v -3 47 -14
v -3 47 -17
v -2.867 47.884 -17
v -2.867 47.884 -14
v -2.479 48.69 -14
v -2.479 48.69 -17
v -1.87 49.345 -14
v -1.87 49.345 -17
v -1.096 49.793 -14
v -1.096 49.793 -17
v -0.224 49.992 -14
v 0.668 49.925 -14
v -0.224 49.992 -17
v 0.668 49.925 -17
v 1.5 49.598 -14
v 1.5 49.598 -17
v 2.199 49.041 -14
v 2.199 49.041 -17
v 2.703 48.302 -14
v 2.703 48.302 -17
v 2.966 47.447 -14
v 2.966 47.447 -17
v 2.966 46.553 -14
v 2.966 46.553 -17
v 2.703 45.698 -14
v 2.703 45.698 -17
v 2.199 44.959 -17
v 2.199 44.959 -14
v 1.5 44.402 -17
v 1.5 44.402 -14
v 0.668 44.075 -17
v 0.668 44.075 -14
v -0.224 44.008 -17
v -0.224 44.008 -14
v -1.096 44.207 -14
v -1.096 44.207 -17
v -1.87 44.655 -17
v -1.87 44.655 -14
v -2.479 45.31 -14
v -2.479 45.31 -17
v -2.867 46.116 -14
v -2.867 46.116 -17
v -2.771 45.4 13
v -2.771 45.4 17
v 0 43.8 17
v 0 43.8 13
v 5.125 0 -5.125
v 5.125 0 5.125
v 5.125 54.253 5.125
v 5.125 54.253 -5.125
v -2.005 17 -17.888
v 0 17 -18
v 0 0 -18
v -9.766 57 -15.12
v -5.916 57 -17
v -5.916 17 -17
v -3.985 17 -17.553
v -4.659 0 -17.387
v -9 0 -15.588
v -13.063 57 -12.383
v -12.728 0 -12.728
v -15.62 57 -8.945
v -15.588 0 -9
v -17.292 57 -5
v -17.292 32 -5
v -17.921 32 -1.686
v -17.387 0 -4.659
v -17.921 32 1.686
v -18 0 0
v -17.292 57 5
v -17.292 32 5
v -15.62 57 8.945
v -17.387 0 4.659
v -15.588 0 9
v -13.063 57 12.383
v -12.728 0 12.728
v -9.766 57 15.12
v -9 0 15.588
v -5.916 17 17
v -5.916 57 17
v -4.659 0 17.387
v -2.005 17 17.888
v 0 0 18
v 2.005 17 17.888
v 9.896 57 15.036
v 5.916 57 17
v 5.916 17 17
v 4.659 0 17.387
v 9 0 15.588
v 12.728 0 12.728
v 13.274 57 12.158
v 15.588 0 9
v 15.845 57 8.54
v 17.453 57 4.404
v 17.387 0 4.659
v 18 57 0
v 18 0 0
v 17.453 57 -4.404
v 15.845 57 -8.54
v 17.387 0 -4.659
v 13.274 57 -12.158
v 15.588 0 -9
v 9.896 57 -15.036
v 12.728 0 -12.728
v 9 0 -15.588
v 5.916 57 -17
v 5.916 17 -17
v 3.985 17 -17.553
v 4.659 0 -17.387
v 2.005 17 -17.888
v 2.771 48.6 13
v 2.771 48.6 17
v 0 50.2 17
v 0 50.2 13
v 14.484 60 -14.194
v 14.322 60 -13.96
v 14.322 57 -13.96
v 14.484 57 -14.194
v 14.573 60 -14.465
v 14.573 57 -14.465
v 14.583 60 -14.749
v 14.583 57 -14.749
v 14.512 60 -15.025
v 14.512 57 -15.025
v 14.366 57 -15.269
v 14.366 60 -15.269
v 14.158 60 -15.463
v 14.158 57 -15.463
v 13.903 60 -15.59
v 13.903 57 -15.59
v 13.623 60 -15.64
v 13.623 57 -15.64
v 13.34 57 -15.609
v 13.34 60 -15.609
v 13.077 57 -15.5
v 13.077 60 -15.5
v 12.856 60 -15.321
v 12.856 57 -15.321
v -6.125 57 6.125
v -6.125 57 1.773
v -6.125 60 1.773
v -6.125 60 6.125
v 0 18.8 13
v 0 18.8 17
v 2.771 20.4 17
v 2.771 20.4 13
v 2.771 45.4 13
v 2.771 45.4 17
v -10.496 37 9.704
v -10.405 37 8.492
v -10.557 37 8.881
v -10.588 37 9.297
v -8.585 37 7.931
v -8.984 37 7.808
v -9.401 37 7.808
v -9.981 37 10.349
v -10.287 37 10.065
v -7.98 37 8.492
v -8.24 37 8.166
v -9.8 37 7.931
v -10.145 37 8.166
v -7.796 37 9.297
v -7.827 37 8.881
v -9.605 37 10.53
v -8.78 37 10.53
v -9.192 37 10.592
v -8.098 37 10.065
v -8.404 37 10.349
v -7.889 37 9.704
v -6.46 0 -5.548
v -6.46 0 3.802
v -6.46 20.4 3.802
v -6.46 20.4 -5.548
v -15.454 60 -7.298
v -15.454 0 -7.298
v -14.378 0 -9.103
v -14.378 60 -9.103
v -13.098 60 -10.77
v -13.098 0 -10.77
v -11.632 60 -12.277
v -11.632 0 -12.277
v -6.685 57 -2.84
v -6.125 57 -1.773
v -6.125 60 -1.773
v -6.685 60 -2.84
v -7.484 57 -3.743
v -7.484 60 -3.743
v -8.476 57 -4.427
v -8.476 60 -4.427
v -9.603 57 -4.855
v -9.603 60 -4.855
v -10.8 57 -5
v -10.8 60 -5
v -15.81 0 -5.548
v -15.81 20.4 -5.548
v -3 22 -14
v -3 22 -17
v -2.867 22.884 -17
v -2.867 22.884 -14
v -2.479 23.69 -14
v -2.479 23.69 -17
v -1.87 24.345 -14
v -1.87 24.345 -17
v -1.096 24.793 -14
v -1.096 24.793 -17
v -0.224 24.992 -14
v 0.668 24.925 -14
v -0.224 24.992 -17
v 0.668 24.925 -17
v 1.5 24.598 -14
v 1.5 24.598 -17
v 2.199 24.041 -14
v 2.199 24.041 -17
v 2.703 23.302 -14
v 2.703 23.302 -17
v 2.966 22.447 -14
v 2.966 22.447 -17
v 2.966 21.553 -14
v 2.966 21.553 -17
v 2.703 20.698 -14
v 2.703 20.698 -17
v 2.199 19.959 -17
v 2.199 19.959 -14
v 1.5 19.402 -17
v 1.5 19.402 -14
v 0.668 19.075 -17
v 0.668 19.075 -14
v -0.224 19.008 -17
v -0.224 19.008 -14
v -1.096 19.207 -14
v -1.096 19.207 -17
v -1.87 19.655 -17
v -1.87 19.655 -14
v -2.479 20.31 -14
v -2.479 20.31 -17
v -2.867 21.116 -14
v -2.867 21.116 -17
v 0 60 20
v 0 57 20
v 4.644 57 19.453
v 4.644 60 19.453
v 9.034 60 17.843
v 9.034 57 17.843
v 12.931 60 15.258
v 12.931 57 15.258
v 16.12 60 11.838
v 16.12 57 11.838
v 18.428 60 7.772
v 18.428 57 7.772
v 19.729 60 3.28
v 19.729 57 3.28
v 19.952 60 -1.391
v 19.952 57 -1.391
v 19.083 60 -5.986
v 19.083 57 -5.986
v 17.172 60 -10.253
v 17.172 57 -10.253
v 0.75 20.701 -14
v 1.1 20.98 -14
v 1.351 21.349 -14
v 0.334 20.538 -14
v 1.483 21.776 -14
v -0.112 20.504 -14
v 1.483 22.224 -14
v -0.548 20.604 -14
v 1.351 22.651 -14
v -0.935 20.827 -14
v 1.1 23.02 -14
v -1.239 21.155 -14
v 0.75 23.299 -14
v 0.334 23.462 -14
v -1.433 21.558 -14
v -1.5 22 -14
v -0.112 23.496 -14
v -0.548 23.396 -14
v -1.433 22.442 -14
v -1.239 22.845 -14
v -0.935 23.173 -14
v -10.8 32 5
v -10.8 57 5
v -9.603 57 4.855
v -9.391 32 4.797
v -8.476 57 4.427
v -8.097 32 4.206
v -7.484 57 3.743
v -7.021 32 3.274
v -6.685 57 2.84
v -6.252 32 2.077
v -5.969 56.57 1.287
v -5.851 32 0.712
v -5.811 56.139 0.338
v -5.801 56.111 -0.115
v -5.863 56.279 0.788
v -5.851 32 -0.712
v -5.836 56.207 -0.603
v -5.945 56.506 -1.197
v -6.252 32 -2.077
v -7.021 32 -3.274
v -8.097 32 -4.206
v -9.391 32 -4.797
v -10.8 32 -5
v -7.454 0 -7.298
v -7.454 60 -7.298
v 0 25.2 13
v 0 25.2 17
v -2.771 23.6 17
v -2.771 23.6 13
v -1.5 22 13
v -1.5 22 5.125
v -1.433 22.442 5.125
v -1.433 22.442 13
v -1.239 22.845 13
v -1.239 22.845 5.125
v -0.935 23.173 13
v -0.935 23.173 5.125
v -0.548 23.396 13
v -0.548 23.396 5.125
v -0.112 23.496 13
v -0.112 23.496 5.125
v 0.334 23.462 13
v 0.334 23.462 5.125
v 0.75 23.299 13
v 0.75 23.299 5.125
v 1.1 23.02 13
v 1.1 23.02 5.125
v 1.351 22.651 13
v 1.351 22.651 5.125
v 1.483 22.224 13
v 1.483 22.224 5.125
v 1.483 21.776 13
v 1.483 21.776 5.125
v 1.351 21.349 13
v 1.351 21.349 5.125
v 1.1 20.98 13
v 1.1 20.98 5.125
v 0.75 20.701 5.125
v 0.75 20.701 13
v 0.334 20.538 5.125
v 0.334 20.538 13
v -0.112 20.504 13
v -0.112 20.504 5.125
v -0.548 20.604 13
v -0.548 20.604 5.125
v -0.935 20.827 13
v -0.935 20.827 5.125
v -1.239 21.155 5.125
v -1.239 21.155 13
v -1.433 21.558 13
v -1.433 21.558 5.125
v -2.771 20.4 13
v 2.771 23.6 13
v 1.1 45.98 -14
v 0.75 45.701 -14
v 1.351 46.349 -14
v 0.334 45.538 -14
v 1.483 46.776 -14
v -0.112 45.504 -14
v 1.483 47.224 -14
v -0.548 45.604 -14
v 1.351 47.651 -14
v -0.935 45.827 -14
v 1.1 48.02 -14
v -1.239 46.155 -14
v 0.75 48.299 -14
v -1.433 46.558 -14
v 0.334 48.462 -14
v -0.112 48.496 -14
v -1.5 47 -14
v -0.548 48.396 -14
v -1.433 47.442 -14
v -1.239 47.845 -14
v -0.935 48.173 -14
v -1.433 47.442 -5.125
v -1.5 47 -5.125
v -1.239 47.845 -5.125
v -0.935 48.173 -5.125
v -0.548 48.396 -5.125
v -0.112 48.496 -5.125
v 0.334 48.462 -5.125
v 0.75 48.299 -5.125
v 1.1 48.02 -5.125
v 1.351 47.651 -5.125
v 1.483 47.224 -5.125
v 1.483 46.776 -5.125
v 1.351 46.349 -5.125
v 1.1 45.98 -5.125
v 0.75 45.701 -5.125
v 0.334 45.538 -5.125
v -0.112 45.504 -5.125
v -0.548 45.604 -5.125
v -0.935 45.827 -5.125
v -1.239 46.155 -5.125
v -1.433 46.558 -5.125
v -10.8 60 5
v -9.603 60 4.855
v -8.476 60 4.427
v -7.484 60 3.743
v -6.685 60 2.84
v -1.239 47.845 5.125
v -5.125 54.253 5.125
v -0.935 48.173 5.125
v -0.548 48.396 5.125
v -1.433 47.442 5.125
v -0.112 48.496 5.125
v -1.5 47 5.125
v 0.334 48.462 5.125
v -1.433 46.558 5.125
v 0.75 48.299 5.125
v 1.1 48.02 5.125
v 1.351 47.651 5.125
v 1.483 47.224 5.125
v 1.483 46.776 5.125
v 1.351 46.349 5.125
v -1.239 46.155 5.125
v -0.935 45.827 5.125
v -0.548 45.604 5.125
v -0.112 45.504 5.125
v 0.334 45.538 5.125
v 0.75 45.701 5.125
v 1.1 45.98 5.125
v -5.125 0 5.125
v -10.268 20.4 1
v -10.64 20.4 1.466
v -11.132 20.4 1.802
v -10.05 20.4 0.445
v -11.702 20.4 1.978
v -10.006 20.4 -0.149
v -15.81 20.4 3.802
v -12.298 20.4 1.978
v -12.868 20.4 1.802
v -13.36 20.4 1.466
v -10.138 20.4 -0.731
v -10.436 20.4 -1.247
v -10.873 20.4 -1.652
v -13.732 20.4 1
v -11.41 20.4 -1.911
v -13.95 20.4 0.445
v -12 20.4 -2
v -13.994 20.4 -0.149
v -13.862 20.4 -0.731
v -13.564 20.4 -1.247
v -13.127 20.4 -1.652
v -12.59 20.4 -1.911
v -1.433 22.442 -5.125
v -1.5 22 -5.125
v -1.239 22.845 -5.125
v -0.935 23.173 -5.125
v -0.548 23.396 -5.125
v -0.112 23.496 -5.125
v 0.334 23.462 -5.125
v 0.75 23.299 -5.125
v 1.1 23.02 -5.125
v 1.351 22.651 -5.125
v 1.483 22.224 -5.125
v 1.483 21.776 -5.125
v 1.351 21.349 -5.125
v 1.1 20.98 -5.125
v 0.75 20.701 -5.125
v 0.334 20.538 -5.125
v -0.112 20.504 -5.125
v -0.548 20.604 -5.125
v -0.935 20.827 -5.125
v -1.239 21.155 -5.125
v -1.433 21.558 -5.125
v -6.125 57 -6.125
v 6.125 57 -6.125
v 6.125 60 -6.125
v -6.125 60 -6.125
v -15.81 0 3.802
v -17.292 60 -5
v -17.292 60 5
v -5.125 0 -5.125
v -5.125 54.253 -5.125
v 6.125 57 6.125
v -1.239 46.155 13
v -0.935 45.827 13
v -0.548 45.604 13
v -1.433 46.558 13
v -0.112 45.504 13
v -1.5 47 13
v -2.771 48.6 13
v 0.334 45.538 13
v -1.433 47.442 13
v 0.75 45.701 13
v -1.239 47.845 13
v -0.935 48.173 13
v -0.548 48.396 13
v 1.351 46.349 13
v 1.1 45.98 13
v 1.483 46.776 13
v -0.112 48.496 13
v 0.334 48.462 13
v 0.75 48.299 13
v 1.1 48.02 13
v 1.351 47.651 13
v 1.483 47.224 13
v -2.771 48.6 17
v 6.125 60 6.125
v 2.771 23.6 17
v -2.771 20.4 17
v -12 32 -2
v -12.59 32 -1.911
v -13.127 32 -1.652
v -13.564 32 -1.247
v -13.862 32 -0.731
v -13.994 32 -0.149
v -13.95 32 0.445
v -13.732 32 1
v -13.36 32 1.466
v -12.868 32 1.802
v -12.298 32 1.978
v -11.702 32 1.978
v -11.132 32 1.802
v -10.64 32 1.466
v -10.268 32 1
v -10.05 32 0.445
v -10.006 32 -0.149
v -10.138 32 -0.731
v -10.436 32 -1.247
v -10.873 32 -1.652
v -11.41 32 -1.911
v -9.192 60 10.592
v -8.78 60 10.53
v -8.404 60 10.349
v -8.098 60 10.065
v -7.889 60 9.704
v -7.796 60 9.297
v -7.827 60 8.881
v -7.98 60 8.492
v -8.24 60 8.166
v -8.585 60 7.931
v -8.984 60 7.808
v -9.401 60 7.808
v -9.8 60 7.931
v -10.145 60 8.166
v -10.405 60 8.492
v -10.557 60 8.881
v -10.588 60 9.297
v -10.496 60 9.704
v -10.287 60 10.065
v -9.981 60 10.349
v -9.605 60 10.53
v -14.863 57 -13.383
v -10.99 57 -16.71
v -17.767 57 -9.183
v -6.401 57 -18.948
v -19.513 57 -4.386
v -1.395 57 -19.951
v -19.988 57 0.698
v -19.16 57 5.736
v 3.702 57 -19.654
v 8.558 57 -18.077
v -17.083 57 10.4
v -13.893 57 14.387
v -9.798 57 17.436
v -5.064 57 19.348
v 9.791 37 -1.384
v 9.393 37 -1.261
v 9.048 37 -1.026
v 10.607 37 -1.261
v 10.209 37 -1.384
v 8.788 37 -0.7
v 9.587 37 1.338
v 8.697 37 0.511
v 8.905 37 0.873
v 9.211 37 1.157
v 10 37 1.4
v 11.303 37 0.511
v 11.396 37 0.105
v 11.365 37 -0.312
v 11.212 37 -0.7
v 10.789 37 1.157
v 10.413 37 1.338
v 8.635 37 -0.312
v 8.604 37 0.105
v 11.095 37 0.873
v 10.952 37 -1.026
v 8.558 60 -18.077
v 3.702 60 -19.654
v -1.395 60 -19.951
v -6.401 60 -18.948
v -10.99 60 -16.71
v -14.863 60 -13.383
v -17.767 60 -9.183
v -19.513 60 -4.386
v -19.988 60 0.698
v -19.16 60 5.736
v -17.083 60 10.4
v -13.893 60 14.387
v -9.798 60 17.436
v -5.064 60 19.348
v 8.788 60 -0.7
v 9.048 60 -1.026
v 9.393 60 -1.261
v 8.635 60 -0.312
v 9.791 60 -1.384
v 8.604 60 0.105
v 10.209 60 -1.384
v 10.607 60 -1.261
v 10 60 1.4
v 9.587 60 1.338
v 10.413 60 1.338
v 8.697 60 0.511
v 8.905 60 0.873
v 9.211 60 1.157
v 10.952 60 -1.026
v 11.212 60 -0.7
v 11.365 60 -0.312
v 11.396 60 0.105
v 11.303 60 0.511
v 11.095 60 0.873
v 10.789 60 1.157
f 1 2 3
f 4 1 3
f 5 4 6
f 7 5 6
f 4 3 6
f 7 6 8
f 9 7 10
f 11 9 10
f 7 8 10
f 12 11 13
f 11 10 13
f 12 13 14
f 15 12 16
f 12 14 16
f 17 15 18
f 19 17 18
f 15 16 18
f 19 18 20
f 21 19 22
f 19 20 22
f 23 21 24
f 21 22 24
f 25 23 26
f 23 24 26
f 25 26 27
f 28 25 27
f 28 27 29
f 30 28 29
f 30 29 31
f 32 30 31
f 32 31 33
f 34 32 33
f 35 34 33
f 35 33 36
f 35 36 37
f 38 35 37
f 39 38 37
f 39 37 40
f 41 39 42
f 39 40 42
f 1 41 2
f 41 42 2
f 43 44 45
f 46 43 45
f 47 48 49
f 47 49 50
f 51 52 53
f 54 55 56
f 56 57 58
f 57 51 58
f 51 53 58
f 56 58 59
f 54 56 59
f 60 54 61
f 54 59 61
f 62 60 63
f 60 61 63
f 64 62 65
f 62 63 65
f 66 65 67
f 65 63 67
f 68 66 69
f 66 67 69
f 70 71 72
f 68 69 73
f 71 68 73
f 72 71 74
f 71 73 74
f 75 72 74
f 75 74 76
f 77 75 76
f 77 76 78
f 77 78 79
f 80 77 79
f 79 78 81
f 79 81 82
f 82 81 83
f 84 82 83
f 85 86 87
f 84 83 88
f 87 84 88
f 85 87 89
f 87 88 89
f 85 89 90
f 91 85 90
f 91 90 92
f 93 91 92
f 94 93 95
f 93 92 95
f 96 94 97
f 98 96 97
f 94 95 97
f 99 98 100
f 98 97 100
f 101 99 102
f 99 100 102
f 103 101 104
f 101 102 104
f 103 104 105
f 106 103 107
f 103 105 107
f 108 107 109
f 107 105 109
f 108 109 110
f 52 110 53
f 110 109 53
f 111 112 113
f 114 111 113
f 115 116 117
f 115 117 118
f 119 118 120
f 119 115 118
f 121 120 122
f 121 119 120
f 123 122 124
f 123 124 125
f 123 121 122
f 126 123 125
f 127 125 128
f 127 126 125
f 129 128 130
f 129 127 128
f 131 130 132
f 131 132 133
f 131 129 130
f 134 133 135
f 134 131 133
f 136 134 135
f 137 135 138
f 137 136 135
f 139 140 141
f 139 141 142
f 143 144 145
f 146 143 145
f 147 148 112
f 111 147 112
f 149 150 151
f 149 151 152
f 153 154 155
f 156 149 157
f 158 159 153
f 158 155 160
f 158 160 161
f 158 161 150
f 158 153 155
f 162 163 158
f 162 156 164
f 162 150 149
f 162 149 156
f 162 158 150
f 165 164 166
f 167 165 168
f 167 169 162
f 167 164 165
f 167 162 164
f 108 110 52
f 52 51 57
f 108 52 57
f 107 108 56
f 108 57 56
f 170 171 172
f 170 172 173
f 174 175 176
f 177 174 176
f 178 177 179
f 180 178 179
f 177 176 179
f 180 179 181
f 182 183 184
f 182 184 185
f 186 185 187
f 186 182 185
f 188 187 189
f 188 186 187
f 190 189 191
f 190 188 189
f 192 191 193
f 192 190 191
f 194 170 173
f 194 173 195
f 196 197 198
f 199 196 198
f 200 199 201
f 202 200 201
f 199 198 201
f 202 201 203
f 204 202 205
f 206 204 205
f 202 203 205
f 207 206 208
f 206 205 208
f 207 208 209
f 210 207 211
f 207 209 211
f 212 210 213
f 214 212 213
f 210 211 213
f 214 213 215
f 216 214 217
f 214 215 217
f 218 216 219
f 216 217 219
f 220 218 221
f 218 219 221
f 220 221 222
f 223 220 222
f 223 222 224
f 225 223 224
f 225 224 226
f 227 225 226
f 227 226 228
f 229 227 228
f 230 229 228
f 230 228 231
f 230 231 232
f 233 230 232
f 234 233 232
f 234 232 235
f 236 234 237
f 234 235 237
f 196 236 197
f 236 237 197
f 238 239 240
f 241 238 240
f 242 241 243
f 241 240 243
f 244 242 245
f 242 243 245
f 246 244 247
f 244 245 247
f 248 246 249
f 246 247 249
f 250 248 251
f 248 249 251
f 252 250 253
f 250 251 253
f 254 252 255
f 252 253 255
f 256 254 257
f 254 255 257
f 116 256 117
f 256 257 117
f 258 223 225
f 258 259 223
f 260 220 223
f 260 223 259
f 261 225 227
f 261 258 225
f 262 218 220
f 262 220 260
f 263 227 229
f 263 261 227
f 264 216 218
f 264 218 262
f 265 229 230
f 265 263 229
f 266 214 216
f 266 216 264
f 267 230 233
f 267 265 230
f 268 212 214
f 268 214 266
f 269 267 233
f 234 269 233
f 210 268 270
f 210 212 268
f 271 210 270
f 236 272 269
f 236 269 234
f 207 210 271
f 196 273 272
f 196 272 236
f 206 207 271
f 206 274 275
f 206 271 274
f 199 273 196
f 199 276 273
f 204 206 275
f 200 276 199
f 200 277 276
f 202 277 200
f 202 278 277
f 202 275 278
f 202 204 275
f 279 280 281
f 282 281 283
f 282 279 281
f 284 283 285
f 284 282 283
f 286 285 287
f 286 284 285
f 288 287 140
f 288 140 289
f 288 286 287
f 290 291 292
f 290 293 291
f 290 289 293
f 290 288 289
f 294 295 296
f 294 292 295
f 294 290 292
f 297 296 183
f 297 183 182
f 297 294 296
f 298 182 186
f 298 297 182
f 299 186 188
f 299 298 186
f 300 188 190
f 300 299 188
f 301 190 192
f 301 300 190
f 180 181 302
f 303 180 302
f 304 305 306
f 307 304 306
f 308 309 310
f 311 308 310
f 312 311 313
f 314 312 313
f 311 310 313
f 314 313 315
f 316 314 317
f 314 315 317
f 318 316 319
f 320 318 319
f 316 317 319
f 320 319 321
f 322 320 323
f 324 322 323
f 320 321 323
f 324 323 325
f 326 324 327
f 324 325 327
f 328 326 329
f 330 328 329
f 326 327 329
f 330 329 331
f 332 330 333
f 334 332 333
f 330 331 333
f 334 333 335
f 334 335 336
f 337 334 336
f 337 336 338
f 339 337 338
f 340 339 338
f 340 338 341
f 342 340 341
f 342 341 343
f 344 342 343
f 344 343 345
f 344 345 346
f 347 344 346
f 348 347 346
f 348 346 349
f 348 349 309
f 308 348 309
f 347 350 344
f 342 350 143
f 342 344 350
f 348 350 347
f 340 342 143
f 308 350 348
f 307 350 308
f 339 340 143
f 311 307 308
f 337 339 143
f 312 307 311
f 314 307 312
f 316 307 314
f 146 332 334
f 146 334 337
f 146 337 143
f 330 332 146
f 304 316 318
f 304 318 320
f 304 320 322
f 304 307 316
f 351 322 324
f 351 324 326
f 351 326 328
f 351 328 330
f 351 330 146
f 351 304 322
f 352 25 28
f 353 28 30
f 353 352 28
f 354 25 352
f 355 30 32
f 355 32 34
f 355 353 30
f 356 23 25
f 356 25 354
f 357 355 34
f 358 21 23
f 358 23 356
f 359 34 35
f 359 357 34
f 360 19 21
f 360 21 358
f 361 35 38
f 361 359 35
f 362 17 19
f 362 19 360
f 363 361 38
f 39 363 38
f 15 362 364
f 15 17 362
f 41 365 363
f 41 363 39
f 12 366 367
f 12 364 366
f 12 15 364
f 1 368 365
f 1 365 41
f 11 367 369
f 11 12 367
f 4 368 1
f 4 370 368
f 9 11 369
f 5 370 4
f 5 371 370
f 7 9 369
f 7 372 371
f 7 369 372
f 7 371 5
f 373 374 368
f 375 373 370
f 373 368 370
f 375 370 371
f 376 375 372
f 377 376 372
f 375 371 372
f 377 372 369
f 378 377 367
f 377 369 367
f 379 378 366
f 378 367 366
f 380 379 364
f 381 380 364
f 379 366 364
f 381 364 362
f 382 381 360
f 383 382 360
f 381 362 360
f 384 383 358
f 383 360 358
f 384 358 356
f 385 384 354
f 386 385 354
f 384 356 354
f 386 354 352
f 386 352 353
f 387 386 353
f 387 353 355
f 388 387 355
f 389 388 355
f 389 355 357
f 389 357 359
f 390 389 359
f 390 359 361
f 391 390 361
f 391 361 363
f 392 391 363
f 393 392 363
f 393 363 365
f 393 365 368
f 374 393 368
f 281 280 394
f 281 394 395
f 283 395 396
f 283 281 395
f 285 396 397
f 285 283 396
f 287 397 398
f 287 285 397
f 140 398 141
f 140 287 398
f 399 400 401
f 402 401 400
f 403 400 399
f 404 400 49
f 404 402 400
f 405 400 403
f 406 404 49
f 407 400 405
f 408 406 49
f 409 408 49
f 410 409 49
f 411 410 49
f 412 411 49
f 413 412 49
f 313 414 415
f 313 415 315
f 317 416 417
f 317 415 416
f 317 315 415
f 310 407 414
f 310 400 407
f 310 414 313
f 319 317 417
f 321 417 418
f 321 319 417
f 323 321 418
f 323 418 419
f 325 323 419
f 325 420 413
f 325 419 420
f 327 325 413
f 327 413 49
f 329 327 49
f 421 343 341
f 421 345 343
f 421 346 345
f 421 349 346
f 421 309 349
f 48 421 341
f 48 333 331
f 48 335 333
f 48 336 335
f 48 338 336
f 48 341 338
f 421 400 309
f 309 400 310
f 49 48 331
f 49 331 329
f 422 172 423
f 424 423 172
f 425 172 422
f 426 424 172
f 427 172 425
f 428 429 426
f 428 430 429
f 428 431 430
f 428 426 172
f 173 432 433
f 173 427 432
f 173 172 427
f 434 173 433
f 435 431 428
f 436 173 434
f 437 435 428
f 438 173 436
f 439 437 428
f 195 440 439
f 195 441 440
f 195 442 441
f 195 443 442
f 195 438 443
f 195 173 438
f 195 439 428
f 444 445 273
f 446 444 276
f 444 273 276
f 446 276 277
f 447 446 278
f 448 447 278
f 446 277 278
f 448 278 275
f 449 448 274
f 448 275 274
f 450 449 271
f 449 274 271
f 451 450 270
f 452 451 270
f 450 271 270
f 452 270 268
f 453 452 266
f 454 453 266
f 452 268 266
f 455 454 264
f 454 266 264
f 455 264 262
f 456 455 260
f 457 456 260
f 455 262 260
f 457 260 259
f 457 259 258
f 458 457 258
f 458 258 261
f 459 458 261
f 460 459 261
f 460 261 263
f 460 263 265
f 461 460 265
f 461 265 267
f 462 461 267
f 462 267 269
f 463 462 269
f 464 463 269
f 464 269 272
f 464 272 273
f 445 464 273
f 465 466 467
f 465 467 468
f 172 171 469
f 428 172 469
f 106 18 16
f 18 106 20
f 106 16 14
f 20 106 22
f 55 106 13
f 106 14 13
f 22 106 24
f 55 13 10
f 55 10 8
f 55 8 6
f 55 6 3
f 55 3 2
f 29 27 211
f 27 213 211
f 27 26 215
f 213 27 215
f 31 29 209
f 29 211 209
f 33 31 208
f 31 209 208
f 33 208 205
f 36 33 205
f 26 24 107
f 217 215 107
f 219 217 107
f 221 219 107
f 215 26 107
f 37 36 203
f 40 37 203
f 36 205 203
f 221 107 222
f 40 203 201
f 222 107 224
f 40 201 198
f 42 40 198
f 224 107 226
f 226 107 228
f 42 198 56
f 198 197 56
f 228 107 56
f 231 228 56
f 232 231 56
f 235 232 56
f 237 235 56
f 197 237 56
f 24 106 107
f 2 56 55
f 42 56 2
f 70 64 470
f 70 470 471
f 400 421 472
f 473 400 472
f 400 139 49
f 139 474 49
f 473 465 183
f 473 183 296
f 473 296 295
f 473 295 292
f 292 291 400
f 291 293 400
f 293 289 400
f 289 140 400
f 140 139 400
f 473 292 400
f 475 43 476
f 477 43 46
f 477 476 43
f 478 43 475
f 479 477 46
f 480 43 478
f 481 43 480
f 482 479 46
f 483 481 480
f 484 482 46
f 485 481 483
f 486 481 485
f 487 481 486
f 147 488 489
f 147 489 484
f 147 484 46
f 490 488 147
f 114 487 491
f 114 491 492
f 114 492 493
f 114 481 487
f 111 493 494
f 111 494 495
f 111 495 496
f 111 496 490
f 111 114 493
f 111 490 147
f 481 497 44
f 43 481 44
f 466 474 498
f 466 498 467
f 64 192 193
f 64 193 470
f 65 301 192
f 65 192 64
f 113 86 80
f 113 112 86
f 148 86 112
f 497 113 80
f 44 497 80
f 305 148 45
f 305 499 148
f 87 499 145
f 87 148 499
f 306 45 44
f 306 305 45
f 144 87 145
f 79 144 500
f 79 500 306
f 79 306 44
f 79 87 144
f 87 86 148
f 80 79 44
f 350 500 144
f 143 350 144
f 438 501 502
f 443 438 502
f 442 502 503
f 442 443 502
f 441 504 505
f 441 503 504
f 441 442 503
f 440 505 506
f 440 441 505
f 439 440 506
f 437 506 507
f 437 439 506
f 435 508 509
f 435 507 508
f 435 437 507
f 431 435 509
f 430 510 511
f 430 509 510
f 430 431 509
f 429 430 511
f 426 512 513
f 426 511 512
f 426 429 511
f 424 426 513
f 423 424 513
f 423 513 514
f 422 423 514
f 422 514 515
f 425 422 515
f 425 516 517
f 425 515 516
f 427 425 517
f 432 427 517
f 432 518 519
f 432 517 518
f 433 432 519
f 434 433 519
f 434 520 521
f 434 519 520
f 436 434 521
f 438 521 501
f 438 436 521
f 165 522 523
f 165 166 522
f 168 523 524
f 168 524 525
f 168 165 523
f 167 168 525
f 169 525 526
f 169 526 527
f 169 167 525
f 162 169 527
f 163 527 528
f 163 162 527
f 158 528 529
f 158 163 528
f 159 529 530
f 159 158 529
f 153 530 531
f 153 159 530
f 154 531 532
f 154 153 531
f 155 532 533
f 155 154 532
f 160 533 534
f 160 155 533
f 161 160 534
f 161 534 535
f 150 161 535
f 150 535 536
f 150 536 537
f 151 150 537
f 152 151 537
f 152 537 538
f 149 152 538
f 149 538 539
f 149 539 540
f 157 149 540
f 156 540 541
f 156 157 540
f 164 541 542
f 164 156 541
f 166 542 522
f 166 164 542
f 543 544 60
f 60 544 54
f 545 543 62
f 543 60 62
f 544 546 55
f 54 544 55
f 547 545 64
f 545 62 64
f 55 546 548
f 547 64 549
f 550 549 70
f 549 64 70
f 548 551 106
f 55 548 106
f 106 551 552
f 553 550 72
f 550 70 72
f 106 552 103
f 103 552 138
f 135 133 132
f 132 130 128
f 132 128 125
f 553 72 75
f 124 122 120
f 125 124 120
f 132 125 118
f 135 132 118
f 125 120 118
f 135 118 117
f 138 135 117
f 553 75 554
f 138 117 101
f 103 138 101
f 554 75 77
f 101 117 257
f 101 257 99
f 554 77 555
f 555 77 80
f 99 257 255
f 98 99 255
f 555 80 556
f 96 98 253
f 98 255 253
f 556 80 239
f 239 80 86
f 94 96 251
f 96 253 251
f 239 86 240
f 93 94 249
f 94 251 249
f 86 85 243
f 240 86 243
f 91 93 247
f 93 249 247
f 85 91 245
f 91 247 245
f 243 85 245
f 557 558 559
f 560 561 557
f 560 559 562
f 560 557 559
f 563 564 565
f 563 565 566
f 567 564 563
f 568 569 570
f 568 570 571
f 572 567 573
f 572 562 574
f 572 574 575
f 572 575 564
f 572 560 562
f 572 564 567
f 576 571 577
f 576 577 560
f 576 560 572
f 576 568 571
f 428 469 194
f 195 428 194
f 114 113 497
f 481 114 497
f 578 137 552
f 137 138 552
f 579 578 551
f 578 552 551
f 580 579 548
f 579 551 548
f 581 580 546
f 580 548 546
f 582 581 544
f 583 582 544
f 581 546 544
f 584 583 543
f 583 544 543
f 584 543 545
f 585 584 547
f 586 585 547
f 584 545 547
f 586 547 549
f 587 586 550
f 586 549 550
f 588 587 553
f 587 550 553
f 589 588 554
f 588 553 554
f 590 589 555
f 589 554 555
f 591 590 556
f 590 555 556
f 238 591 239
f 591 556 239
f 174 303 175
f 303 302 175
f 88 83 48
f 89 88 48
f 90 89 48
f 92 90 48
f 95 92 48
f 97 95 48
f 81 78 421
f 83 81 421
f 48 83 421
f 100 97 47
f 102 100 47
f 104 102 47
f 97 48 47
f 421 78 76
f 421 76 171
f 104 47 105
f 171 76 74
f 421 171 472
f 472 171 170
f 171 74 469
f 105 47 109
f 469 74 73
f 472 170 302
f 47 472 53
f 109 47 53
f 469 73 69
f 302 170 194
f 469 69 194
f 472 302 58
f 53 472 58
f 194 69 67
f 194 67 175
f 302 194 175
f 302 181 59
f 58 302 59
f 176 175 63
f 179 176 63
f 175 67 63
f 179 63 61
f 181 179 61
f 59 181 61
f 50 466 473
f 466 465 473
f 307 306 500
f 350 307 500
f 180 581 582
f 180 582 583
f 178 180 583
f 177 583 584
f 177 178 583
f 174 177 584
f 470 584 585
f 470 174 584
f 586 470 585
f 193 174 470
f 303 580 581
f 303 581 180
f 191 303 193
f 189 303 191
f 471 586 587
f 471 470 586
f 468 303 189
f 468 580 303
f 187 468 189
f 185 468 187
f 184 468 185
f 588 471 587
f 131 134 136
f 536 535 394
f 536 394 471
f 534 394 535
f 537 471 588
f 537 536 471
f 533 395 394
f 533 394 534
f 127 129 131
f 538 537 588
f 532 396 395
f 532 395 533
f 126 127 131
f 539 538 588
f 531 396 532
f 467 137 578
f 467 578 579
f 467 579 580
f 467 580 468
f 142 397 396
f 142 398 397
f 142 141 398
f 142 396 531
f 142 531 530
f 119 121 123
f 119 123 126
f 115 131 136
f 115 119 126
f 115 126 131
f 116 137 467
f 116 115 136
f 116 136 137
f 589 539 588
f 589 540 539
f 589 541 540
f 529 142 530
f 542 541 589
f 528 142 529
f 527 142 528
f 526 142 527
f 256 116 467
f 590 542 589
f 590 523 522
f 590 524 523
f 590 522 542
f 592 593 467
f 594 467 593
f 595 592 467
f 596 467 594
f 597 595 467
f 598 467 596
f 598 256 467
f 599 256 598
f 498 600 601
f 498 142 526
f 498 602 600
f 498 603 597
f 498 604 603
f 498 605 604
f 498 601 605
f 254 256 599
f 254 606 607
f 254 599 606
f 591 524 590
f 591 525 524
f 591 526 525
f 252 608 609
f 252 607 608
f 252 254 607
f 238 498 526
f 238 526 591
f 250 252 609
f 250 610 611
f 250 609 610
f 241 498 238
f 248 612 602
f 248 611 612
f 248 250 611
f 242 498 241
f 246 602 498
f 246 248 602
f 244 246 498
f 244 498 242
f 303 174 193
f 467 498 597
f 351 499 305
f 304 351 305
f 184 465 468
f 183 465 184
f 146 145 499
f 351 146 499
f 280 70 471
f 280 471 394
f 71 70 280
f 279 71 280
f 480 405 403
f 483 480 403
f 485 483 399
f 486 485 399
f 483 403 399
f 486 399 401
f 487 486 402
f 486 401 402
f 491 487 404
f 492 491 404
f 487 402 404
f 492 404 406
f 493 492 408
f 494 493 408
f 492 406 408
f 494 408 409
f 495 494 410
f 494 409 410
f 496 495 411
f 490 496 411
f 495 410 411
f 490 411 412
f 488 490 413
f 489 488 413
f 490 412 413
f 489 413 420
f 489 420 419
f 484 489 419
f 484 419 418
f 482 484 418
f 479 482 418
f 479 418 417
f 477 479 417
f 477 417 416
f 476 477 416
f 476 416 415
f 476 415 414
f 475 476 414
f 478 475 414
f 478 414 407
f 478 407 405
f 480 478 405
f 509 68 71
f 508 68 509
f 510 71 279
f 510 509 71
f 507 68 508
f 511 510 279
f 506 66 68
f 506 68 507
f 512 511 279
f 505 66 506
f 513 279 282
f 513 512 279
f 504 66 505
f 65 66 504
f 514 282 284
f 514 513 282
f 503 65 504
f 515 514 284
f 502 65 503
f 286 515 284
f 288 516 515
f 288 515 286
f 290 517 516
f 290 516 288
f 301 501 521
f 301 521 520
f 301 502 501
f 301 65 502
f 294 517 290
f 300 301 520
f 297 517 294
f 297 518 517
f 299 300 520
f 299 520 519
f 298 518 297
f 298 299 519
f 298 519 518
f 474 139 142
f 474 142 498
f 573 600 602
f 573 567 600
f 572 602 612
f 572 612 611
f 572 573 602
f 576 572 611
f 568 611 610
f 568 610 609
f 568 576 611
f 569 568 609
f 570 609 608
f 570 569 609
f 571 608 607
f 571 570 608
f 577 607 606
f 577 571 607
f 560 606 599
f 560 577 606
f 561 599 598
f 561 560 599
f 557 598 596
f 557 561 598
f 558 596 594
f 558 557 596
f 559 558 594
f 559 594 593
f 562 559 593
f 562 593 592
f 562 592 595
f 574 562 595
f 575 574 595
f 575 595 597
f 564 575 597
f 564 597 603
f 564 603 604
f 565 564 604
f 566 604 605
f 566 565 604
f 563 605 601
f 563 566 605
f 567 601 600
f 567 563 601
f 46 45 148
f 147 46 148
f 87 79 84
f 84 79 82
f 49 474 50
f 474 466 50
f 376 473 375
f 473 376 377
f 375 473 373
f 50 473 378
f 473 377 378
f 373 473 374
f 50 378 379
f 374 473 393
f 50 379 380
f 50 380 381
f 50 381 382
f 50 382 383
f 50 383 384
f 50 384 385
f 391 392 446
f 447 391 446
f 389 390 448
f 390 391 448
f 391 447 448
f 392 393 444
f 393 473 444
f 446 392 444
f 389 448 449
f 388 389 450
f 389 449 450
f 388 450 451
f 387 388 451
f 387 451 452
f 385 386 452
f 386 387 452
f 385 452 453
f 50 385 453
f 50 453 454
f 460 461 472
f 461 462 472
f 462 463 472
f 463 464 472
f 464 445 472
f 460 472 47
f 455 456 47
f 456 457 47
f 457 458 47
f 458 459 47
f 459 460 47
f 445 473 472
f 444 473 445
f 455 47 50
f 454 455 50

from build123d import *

# Parameters (mm, degrees)
SKETCH1_R           = 18
SKETCH1_R_2         = 2
SKETCH1_W           = 10.25
SKETCH1_H           = 10.25
BOSS_EXTRUDE1_DEPTH = 57
CUT_EXTRUDE1_START  = -25
CUT_EXTRUDE1_DEPTH  = 25
SKETCH4_W           = 9.35
SKETCH4_H           = 9.35
CUT_EXTRUDE3_DEPTH  = 20.4
CUT_EXTRUDE4_START  = -40
CUT_EXTRUDE4_DEPTH  = 40
SKETCH6_R           = 1.5
CUT_EXTRUDE5_DEPTH  = 70.267597042
SKETCH7_R           = 3
CUT_EXTRUDE6_DEPTH  = 3
CUT_EXTRUDE7_DEPTH  = 4
CHAMFER1_SIZE       = 1
CHAMFER1_SIZE_2     = 2.747477419
CUT_EXTRUDE8_DEPTH  = 63.42595614
SKETCH12_R          = 1.4
CUT_EXTRUDE10_DEPTH = 20
SKETCH13_R          = 20
SKETCH13_R_2        = 1.4
BOSS_EXTRUDE2_DEPTH = 3
BOSS_EXTRUDE3_DEPTH = 3


with BuildPart() as part:
    # Sketch1 → Boss-Extrude1 (new body)
    with BuildSketch(Plane(origin=(0, 0, 0), x_dir=(1, 0, 0), z_dir=(0, 1, 0))):
        with Locations(Location((0, 0, 0), (0, 0, 90))):
            Circle(SKETCH1_R)
        with Locations(Location((-12, 0, 0), (0, 0, 90))):
            Circle(SKETCH1_R_2, mode=Mode.SUBTRACT)
        Rectangle(SKETCH1_W, SKETCH1_H, mode=Mode.SUBTRACT)
    extrude(amount=BOSS_EXTRUDE1_DEPTH)

    # Sketch2 → Cut-Extrude1 (cut)
    with BuildSketch(Plane(origin=(0, 57, 0), x_dir=(1, 0, 0), z_dir=(0, 1, 0)).offset(CUT_EXTRUDE1_START)):
        with BuildLine():
            Line((-10.8, 5), (-17.291616466, 5))
            ThreePointArc((-17.291616466, 5), (-18, 0), (-17.291616466, -5))
            Line((-17.291616466, -5), (-10.8, -5))
            ThreePointArc((-10.8, -5), (-5.8, 0), (-10.8, 5))
        make_face()
    extrude(amount=CUT_EXTRUDE1_DEPTH, mode=Mode.SUBTRACT)

    # Sketch4 → Cut-Extrude3 (cut)
    with BuildSketch(Plane(origin=(0, 0, 0), x_dir=(-1, 0, 0), z_dir=(0, -1, 0))):
        with Locations((11.135393506, 0.872889968)):
            Rectangle(SKETCH4_W, SKETCH4_H)
    extrude(amount=-CUT_EXTRUDE3_DEPTH, mode=Mode.SUBTRACT)

    # Sketch5 → Cut-Extrude4 (cut)
    with BuildSketch(Plane(origin=(0, 57, 0), x_dir=(1, 0, 0), z_dir=(0, 1, 0)).offset(CUT_EXTRUDE4_START)):
        with BuildLine():
            Line((5.916079783, 17), (-5.916079783, 17))
            ThreePointArc((-5.916079783, 17), (0, 18), (5.916079783, 17))
        make_face()
        with BuildLine():
            Line((5.916079783, -17), (-5.916079783, -17))
            ThreePointArc((-5.916079783, -17), (0, -18), (5.916079783, -17))
        make_face()
    extrude(amount=CUT_EXTRUDE4_DEPTH, mode=Mode.SUBTRACT)

    # Sketch6 → Cut-Extrude5 (cut, through all)
    with BuildSketch(Plane(origin=(0, 0, -17), x_dir=(-1, 0, 0), z_dir=(0, 0, -1))):
        with Locations((0, 47)):
            Circle(SKETCH6_R)
        with Locations((0, 22)):
            Circle(SKETCH6_R)
    extrude(amount=-CUT_EXTRUDE5_DEPTH, mode=Mode.SUBTRACT)

    # Sketch7 → Cut-Extrude6 (cut)
    with BuildSketch(Plane(origin=(0, 0, -17), x_dir=(-1, 0, 0), z_dir=(0, 0, -1))):
        with Locations((0, 47)):
            Circle(SKETCH7_R)
        with Locations((0, 22)):
            Circle(SKETCH7_R)
    extrude(amount=-CUT_EXTRUDE6_DEPTH, mode=Mode.SUBTRACT)

    # Sketch8 → Cut-Extrude7 (cut)
    with BuildSketch(Plane.XY.offset(17)):
        Polygon((0, 43.8), (2.771281292, 45.4), (2.771281292, 48.6), (0, 50.2), (-2.771281292, 48.6), (-2.771281292, 45.4), align=None)
        Polygon((0, 18.8), (2.771281292, 20.4), (2.771281292, 23.6), (0, 25.2), (-2.771281292, 23.6), (-2.771281292, 20.4), align=None)
    extrude(amount=-CUT_EXTRUDE7_DEPTH, mode=Mode.SUBTRACT)

    # Chamfer1
    # the kernel refuses this chamfer: 2.747477419, 1 mm, written as the material it takes off along each edge
    with BuildSketch(Plane(origin=(-5.125, 57, -5.125), x_dir=(0, 0.09904090225204956, -0.9950833631817488), z_dir=(1, 0, 0)), Plane(origin=(-5.125, 57, 5.125), x_dir=(-0.9950833631817488, 0.09904090225204956, 0), z_dir=(0, 0, -1)), Plane(origin=(5.125, 57, 5.125), x_dir=(0, 0.09904090225204956, 0.9950833631817488), z_dir=(-1, 0, 0)), Plane(origin=(5.125, 57, -5.125), x_dir=(0.9950833631817488, 0.09904090225204956, 0), z_dir=(0, 0, 1))) as chamfer1_piece_1:
        Polygon((CHAMFER1_SIZE * 0.995083363182, -CHAMFER1_SIZE * 0.099040902252), (-CHAMFER1_SIZE_2 * 0.0990409022684, -CHAMFER1_SIZE_2 * 0.995083363346), (0, 0), align=None)
    extrude(amount=10.25, mode=Mode.SUBTRACT)
    with BuildSketch(Plane(origin=(-5.125, 57, 5.125), x_dir=(-0.9950833631817488, 0.09904090225204956, 0), z_dir=(0, 0, -1))) as chamfer1_piece_2a_section:
        Polygon((CHAMFER1_SIZE * 0.995083363182, -CHAMFER1_SIZE * 0.099040902252), (-CHAMFER1_SIZE_2 * 0.0990409022684, -CHAMFER1_SIZE_2 * 0.995083363346), (0, 0), align=None)
    chamfer1_piece_2a = extrude(amount=17.377491449, mode=Mode.PRIVATE)
    chamfer1_piece_2a = split(chamfer1_piece_2a, bisect_by=Plane(origin=(-5.432505006, 56.059901151, -5.125), z_dir=(0, 0, -1)), keep=Keep.TOP, mode=Mode.PRIVATE)
    with BuildSketch(Plane(origin=(-12.252491449, 57, -5.125), x_dir=(0, 0.09904090225204956, -0.9950833631817488), z_dir=(1, 0, 0))) as chamfer1_piece_2b_section:
        Polygon((CHAMFER1_SIZE * 0.995083363182, -CHAMFER1_SIZE * 0.099040902252), (-CHAMFER1_SIZE_2 * 0.0990409022684, -CHAMFER1_SIZE_2 * 0.995083363346), (0, 0), align=None)
    chamfer1_piece_2b = extrude(amount=17.377491449, mode=Mode.PRIVATE)
    chamfer1_piece_2b = split(chamfer1_piece_2b, bisect_by=Plane(origin=(-5.125, 56.059901151, -5.432505006), z_dir=(-1, 0, 0)), keep=Keep.TOP, mode=Mode.PRIVATE)
    chamfer1_piece_2 = chamfer1_piece_2a & chamfer1_piece_2b
    add(chamfer1_piece_2, mode=Mode.SUBTRACT)
    with BuildSketch(Plane(origin=(5.125, 57, -12.252491449), x_dir=(0.9950833631817488, 0.09904090225204956, 0), z_dir=(0, 0, 1))) as chamfer1_piece_3a_section:
        Polygon((CHAMFER1_SIZE * 0.995083363182, -CHAMFER1_SIZE * 0.099040902252), (-CHAMFER1_SIZE_2 * 0.0990409022684, -CHAMFER1_SIZE_2 * 0.995083363346), (0, 0), align=None)
    chamfer1_piece_3a = extrude(amount=17.377491449, mode=Mode.PRIVATE)
    chamfer1_piece_3a = split(chamfer1_piece_3a, bisect_by=Plane(origin=(5.432505006, 56.059901151, -5.125), z_dir=(0, 0, -1)), keep=Keep.TOP, mode=Mode.PRIVATE)
    with BuildSketch(Plane(origin=(-5.125, 57, -5.125), x_dir=(0, 0.09904090225204956, -0.9950833631817488), z_dir=(1, 0, 0))) as chamfer1_piece_3b_section:
        Polygon((CHAMFER1_SIZE * 0.995083363182, -CHAMFER1_SIZE * 0.099040902252), (-CHAMFER1_SIZE_2 * 0.0990409022684, -CHAMFER1_SIZE_2 * 0.995083363346), (0, 0), align=None)
    chamfer1_piece_3b = extrude(amount=17.377491449, mode=Mode.PRIVATE)
    chamfer1_piece_3b = split(chamfer1_piece_3b, bisect_by=Plane(origin=(5.125, 56.059901151, -5.432505006), z_dir=(1, 0, 0)), keep=Keep.TOP, mode=Mode.PRIVATE)
    chamfer1_piece_3 = chamfer1_piece_3a & chamfer1_piece_3b
    add(chamfer1_piece_3, mode=Mode.SUBTRACT)
    with BuildSketch(Plane(origin=(5.125, 57, 5.125), x_dir=(0, 0.09904090225204956, 0.9950833631817488), z_dir=(-1, 0, 0))) as chamfer1_piece_4a_section:
        Polygon((CHAMFER1_SIZE * 0.995083363182, -CHAMFER1_SIZE * 0.099040902252), (-CHAMFER1_SIZE_2 * 0.0990409022684, -CHAMFER1_SIZE_2 * 0.995083363346), (0, 0), align=None)
    chamfer1_piece_4a = extrude(amount=17.377491449, mode=Mode.PRIVATE)
    chamfer1_piece_4a = split(chamfer1_piece_4a, bisect_by=Plane(origin=(-5.125, 56.059901151, 5.432505006), z_dir=(-1, 0, 0)), keep=Keep.TOP, mode=Mode.PRIVATE)
    with BuildSketch(Plane(origin=(-5.125, 57, 12.252491449), x_dir=(-0.9950833631817488, 0.09904090225204956, 0), z_dir=(0, 0, -1))) as chamfer1_piece_4b_section:
        Polygon((CHAMFER1_SIZE * 0.995083363182, -CHAMFER1_SIZE * 0.099040902252), (-CHAMFER1_SIZE_2 * 0.0990409022684, -CHAMFER1_SIZE_2 * 0.995083363346), (0, 0), align=None)
    chamfer1_piece_4b = extrude(amount=17.377491449, mode=Mode.PRIVATE)
    chamfer1_piece_4b = split(chamfer1_piece_4b, bisect_by=Plane(origin=(-5.432505006, 56.059901151, 5.125), z_dir=(0, 0, 1)), keep=Keep.TOP, mode=Mode.PRIVATE)
    chamfer1_piece_4 = chamfer1_piece_4a & chamfer1_piece_4b
    add(chamfer1_piece_4, mode=Mode.SUBTRACT)
    with BuildSketch(Plane(origin=(12.252491449, 57, 5.125), x_dir=(0, 0.09904090225204956, 0.9950833631817488), z_dir=(-1, 0, 0))) as chamfer1_piece_5a_section:
        Polygon((CHAMFER1_SIZE * 0.995083363182, -CHAMFER1_SIZE * 0.099040902252), (-CHAMFER1_SIZE_2 * 0.0990409022684, -CHAMFER1_SIZE_2 * 0.995083363346), (0, 0), align=None)
    chamfer1_piece_5a = extrude(amount=17.377491449, mode=Mode.PRIVATE)
    chamfer1_piece_5a = split(chamfer1_piece_5a, bisect_by=Plane(origin=(5.125, 56.059901151, 5.432505006), z_dir=(1, 0, 0)), keep=Keep.TOP, mode=Mode.PRIVATE)
    with BuildSketch(Plane(origin=(5.125, 57, -5.125), x_dir=(0.9950833631817488, 0.09904090225204956, 0), z_dir=(0, 0, 1))) as chamfer1_piece_5b_section:
        Polygon((CHAMFER1_SIZE * 0.995083363182, -CHAMFER1_SIZE * 0.099040902252), (-CHAMFER1_SIZE_2 * 0.0990409022684, -CHAMFER1_SIZE_2 * 0.995083363346), (0, 0), align=None)
    chamfer1_piece_5b = extrude(amount=17.377491449, mode=Mode.PRIVATE)
    chamfer1_piece_5b = split(chamfer1_piece_5b, bisect_by=Plane(origin=(5.432505006, 56.059901151, 5.125), z_dir=(0, 0, 1)), keep=Keep.TOP, mode=Mode.PRIVATE)
    chamfer1_piece_5 = chamfer1_piece_5a & chamfer1_piece_5b
    add(chamfer1_piece_5, mode=Mode.SUBTRACT)

    # Sketch9 → Cut-Extrude8 (cut, through all)
    with BuildSketch(Plane.XZ):
        with BuildLine():
            Line((-7.454203172, -7.297889968), (-15.454203172, -7.297889968))
            ThreePointArc((-15.454203172, -7.297889968), (-13.761984914, -9.955415688), (-11.632322635, -12.277178848))
            Line((-11.632322635, -12.277178848), (-7.454203172, -7.297889968))
        make_face()
    extrude(amount=-CUT_EXTRUDE8_DEPTH, mode=Mode.SUBTRACT)

    # Sketch12 → Cut-Extrude10 (cut)
    with BuildSketch(Plane(origin=(0, 57, 0), x_dir=(1, 0, 0), z_dir=(0, 1, 0))):
        with Locations(Location((10, 0, 0), (0, 0, 270))):
            Circle(SKETCH12_R)
        with Locations(Location((-9.192388155, -9.192388155, 0), (0, 0, 270))):
            Circle(SKETCH12_R)
    extrude(amount=-CUT_EXTRUDE10_DEPTH, mode=Mode.SUBTRACT)

    # Sketch13 → Boss-Extrude2 (add)
    with BuildSketch(Plane(origin=(0, 57, 0), x_dir=(1, 0, 0), z_dir=(0, 1, 0))):
        with Locations(Location((0, 0, 0), (0, 0, 270))):
            Circle(SKETCH13_R)
        with Locations(Location((10, 0, 0), (0, 0, 270))):
            Circle(SKETCH13_R_2, mode=Mode.SUBTRACT)
        with Locations(Location((-9.192388155, -9.192388155, 0), (0, 0, 270))):
            Circle(SKETCH13_R_2, mode=Mode.SUBTRACT)
        with BuildLine():
            Line((-10.8, 5), (-17.291616466, 5))
            Line((-17.291616466, 5), (-17.291616466, -5))
            Line((-17.291616466, -5), (-10.8, -5))
            ThreePointArc((-10.8, -5), (-7.959770503, -4.114984375), (-6.125, -1.773238563))
            Line((-6.125, -1.773238563), (-6.125, -6.125))
            Line((-6.125, -6.125), (6.125, -6.125))
            Line((6.125, -6.125), (6.125, 6.125))
            Line((6.125, 6.125), (-6.125, 6.125))
            Line((-6.125, 6.125), (-6.125, 1.773238563))
            ThreePointArc((-6.125, 1.773238563), (-7.959770503, 4.114984375), (-10.8, 5))
        make_face(mode=Mode.SUBTRACT)
        with BuildLine():
            Line((-7.454203172, 7.297889968), (-15.454203172, 7.297889968))
            ThreePointArc((-15.454203172, 7.297889968), (-13.761984914, 9.955415688), (-11.632322635, 12.277178848))
            Line((-11.632322635, 12.277178848), (-7.454203172, 7.297889968))
        make_face(mode=Mode.SUBTRACT)
    extrude(amount=BOSS_EXTRUDE2_DEPTH)

    # Sketch14 → Boss-Extrude3 (add)
    with BuildSketch(Plane(origin=(0, 60, 0), x_dir=(1, 0, 0), z_dir=(0, 1, 0))):
        with BuildLine():
            Line((12.855752194, 15.320888862), (14.321646009, 13.960317173))
            ThreePointArc((14.321646009, 13.960317173), (14.268984946, 15.373549926), (12.855752194, 15.320888862))
        make_face()
    extrude(amount=-BOSS_EXTRUDE3_DEPTH)


solid = part.part
